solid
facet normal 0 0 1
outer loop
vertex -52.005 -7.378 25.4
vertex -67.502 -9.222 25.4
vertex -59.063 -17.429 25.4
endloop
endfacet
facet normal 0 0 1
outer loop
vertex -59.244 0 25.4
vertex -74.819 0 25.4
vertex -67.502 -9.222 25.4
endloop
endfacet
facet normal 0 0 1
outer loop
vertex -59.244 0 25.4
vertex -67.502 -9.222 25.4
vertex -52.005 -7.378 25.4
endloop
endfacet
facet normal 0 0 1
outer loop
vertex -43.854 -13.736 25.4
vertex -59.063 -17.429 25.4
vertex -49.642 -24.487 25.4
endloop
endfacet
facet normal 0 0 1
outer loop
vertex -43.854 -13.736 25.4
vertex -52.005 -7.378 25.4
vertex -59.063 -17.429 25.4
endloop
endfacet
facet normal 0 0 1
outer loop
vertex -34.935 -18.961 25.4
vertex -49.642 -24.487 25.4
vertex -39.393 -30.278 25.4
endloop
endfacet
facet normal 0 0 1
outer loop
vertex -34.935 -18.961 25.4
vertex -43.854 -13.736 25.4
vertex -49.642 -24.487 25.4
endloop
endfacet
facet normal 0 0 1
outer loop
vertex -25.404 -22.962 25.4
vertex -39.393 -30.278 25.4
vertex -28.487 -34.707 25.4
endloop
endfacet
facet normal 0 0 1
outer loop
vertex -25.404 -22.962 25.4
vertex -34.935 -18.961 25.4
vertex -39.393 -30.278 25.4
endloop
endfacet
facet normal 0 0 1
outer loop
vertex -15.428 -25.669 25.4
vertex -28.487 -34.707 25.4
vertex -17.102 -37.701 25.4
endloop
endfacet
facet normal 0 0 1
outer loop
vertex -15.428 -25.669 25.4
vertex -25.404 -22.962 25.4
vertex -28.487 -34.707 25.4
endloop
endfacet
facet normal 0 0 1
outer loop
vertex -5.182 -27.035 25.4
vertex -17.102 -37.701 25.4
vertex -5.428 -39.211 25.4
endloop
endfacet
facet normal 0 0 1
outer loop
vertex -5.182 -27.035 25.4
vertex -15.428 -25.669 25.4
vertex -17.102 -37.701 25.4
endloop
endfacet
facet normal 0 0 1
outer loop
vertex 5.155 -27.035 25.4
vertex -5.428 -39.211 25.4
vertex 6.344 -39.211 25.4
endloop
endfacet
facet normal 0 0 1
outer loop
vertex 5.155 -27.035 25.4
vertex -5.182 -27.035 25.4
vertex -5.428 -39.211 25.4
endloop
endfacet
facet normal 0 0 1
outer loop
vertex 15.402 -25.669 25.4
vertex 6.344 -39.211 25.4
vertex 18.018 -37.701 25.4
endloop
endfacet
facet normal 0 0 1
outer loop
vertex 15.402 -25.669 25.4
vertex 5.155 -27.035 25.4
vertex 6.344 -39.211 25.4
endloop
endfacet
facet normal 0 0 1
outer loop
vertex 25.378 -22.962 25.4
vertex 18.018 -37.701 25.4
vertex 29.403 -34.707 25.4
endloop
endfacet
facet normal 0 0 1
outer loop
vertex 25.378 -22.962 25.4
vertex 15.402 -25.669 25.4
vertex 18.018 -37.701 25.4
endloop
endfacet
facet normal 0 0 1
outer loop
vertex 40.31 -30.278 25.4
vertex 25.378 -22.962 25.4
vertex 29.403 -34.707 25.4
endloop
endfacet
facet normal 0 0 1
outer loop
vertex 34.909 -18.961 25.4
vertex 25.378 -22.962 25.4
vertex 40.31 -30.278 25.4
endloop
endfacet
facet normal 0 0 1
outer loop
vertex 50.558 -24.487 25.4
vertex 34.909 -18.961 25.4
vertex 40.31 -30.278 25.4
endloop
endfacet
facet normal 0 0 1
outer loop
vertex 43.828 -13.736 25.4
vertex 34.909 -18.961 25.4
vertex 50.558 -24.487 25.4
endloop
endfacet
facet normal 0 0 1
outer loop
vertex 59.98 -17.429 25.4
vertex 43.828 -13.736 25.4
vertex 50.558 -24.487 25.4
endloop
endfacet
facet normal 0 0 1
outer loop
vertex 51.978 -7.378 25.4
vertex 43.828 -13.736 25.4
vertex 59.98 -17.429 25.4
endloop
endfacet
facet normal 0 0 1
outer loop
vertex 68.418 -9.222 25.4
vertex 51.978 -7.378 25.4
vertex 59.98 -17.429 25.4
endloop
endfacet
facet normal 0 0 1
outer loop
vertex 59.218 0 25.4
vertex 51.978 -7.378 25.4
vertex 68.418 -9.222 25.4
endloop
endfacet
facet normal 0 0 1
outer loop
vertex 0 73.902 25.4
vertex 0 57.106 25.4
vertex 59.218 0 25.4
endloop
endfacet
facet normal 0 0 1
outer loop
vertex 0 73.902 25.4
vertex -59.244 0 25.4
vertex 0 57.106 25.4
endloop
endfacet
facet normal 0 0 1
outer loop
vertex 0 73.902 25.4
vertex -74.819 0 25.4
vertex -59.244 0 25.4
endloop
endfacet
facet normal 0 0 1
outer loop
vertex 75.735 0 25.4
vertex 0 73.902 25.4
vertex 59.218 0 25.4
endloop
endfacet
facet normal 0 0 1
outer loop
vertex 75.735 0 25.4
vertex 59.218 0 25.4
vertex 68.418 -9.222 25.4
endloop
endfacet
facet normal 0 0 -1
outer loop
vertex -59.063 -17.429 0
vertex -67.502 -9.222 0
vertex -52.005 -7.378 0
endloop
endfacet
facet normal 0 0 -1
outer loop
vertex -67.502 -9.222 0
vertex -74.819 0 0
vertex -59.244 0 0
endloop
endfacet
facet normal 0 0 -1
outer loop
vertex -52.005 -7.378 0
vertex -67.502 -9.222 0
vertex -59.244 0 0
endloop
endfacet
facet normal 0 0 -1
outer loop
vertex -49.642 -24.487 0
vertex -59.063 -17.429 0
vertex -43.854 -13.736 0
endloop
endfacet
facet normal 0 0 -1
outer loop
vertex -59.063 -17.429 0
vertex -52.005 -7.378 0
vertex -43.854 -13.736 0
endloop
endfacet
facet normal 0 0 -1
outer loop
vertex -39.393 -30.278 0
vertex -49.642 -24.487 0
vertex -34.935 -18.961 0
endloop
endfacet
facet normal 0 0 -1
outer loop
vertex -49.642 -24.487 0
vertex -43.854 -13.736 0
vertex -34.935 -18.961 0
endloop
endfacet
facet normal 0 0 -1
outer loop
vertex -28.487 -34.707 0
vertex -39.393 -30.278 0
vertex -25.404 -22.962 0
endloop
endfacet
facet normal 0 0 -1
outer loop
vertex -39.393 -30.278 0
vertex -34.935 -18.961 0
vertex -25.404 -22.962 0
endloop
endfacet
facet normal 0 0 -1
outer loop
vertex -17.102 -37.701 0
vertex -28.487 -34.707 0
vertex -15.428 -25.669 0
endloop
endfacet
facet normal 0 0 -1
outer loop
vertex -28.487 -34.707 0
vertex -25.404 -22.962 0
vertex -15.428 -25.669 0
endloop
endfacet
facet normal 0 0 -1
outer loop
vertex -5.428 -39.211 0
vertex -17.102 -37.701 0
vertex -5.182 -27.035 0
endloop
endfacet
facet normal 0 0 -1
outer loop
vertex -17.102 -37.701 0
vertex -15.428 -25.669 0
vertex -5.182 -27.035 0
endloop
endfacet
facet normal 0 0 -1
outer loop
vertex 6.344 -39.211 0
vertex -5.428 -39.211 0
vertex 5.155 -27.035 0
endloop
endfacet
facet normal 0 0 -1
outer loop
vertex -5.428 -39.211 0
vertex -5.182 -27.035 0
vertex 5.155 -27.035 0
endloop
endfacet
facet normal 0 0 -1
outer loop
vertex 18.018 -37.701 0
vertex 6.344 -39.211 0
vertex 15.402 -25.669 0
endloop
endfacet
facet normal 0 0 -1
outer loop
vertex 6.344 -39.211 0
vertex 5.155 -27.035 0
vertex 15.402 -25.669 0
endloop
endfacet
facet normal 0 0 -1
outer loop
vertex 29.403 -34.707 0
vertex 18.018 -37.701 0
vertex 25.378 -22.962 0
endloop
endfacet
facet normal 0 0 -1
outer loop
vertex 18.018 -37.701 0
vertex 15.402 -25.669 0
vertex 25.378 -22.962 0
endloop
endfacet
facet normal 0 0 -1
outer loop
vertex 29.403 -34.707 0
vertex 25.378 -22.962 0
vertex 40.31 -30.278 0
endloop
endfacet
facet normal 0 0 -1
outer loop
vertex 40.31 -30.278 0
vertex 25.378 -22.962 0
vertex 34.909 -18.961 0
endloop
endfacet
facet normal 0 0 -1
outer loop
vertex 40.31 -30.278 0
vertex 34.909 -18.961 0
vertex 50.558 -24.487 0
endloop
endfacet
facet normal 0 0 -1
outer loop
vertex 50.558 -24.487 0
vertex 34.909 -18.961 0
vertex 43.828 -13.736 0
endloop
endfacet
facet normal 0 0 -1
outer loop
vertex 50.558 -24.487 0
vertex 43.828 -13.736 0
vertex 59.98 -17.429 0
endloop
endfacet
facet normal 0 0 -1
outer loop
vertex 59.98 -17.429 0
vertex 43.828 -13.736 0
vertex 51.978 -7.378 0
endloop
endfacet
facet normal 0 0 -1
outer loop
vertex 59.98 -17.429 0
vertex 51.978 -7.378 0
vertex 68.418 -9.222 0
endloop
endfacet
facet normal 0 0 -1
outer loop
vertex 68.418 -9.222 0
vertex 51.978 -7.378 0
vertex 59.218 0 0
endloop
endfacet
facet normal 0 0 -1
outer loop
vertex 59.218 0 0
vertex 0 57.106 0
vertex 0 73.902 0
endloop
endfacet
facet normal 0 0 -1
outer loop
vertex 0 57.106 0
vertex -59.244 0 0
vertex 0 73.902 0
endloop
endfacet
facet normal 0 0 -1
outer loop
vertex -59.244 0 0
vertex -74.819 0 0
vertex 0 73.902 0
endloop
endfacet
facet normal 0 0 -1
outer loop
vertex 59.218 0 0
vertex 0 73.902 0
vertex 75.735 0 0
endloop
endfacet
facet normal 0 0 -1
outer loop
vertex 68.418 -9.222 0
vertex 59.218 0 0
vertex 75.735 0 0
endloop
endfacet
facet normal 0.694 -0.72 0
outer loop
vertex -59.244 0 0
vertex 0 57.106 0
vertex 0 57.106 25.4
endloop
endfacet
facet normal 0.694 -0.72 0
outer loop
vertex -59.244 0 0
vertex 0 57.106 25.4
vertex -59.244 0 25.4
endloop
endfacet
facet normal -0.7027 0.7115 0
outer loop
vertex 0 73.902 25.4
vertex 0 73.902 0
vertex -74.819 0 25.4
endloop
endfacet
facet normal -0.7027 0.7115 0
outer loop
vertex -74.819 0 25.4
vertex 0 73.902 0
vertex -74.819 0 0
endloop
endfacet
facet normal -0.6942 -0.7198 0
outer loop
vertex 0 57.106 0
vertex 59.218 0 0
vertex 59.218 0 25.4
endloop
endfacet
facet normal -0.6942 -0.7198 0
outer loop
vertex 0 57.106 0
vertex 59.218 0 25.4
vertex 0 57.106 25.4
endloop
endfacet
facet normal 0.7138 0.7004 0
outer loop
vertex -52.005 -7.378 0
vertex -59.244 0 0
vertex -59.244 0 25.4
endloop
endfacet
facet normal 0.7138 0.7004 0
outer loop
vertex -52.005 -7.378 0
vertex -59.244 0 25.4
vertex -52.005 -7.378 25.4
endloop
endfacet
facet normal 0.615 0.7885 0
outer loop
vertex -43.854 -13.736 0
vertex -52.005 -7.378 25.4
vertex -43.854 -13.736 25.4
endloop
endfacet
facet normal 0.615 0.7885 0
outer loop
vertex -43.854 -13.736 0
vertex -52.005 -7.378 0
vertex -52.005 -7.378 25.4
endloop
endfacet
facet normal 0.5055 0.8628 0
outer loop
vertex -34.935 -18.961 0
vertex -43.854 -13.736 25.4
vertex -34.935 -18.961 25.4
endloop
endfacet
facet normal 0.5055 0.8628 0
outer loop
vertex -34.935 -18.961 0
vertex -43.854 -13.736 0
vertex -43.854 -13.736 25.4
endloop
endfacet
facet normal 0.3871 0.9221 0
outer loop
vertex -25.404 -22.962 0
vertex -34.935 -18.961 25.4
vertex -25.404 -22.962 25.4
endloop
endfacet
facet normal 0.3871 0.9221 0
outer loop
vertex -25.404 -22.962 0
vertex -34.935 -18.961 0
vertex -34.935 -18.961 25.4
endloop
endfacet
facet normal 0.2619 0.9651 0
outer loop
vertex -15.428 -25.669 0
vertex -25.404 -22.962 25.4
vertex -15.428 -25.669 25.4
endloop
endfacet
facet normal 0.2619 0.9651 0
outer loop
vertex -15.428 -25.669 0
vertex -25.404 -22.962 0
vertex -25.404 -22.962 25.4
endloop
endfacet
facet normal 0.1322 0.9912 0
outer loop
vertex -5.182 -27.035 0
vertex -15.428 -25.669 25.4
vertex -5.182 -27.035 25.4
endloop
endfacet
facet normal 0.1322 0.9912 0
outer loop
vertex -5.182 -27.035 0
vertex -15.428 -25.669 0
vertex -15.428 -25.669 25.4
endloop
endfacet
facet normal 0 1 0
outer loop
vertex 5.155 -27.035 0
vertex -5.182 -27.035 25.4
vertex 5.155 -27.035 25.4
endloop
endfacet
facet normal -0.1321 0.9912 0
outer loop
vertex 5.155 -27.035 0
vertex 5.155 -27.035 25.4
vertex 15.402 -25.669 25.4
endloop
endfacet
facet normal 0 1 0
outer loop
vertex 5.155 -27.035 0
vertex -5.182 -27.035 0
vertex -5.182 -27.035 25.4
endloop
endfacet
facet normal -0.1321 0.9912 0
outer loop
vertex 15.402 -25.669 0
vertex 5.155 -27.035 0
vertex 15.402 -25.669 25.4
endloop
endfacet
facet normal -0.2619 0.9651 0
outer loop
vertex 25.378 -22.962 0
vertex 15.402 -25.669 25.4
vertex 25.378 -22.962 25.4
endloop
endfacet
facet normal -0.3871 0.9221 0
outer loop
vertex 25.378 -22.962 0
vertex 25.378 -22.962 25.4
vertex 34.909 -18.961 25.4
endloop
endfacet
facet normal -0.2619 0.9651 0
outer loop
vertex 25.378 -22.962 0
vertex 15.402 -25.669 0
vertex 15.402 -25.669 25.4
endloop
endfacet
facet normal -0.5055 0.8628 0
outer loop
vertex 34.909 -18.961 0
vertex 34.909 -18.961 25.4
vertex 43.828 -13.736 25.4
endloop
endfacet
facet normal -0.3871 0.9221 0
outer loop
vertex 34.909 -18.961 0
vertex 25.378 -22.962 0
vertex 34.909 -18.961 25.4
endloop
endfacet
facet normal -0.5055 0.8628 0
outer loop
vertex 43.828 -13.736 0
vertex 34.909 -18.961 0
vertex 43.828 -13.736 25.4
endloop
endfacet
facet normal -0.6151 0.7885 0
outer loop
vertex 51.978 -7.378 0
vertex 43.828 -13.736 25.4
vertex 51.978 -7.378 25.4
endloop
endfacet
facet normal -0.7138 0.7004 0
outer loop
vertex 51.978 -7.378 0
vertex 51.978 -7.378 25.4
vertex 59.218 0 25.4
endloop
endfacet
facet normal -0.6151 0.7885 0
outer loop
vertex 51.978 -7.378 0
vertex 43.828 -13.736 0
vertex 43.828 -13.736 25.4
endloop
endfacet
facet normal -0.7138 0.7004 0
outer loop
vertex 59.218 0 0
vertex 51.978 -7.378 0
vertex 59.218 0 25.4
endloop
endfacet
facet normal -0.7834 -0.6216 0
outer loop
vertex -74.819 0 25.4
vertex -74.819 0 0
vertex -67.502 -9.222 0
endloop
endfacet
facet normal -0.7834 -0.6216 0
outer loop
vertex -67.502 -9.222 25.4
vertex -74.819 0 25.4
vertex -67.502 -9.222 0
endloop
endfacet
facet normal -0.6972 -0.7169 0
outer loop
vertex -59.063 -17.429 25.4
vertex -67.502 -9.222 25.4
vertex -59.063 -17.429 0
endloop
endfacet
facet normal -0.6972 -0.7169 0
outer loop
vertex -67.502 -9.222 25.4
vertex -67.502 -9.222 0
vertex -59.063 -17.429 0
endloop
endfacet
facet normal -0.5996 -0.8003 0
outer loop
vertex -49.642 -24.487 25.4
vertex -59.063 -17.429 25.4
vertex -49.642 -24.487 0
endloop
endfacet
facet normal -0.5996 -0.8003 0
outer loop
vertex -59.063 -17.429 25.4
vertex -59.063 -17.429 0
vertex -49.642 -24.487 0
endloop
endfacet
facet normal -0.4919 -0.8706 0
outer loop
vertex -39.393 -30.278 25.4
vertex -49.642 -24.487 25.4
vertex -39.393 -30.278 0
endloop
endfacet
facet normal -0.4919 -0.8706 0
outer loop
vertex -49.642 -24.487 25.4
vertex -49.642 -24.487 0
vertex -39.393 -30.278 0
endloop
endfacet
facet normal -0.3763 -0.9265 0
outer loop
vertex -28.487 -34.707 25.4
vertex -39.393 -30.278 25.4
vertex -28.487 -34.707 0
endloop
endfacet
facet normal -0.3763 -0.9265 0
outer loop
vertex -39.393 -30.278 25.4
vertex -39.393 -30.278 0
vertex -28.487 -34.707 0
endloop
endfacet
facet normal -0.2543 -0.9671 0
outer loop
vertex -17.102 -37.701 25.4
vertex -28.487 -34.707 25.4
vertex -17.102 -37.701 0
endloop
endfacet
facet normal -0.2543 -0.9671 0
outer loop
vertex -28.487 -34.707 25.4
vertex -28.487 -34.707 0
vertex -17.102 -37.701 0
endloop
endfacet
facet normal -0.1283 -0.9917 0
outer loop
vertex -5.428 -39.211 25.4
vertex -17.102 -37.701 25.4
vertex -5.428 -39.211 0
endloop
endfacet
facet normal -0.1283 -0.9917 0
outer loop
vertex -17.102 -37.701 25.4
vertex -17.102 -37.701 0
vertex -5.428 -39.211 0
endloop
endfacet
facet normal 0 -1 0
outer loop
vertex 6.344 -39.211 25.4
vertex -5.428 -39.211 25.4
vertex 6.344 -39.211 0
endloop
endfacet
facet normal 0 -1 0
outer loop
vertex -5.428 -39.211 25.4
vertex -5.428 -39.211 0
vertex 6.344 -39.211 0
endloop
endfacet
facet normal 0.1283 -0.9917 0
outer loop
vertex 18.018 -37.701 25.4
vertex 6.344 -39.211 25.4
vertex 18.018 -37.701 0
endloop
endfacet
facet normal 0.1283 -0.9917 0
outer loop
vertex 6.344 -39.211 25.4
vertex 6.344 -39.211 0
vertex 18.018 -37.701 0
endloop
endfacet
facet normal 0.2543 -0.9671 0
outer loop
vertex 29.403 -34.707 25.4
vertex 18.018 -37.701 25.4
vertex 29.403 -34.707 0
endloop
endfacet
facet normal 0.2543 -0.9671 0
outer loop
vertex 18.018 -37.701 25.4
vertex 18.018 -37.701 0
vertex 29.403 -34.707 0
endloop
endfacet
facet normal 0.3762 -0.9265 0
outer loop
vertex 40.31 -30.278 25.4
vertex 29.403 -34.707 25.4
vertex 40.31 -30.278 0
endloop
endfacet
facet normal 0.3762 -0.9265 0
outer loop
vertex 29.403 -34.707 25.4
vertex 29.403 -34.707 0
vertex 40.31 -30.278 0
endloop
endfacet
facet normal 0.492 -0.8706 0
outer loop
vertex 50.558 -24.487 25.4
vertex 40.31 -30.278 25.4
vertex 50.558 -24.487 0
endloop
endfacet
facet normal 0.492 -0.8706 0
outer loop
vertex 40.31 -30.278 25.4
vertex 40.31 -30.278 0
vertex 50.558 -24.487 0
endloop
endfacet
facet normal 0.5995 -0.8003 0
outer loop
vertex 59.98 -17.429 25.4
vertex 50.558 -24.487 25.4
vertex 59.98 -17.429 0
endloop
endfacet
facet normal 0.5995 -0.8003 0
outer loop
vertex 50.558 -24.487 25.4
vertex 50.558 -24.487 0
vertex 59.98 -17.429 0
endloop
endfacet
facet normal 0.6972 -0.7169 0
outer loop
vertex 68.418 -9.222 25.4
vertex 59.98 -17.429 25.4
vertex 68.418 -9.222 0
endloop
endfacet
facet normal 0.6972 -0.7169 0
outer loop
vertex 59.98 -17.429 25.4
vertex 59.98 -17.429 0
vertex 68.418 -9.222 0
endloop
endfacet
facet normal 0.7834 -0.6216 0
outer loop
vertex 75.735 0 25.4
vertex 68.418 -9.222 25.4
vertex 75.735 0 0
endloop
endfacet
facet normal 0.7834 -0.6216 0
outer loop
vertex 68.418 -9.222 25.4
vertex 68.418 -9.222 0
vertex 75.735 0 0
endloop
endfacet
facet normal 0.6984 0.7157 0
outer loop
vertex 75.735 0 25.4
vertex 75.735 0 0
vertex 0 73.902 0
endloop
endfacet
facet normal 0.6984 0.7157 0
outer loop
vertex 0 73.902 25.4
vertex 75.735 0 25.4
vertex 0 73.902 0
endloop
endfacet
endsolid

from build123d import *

# Parameters (mm, degrees)
F1_DEPTH = 25.4
F3_DEPTH = 25.4
F5_DEPTH = 25.4


with BuildPart() as f1:
    # F0 (on Top) → F1 (new body)
    with BuildSketch(Plane.XY):
        with BuildLine():
            Line((75.73466, 0), (0, 73.902369))
            Line((0, 73.902369), (-74.818514, 0))
            ThreePointArc((-74.818514, 0), (0.458073, -39.399989), (75.73466, 0))
        make_face()
    extrude(amount=F1_DEPTH)

    # F2 (on Top) → F3 (cut)
    with BuildSketch(Plane.XY):
        with BuildLine():
            Line((63.833756, 0), (0, 62.908627))
            Line((0, 62.908627), (-62.168982, -0.174606))
            ThreePointArc((-62.168982, -0.174606), (0.876457, -31.889673), (63.833756, 0))
        make_face()
    extrude(amount=-F3_DEPTH, mode=Mode.SUBTRACT)

    # F4 (on Top) → F5 (cut)
    with BuildSketch(Plane.XY):
        with BuildLine():
            Line((59.217848, 0), (0, 57.106376))
            Line((0, 57.106376), (-59.244044, 0))
            ThreePointArc((-59.244044, 0), (-0.013098, -27.205963), (59.217848, 0))
        make_face()
    extrude(amount=F5_DEPTH, mode=Mode.SUBTRACT)


solid = f1.part
